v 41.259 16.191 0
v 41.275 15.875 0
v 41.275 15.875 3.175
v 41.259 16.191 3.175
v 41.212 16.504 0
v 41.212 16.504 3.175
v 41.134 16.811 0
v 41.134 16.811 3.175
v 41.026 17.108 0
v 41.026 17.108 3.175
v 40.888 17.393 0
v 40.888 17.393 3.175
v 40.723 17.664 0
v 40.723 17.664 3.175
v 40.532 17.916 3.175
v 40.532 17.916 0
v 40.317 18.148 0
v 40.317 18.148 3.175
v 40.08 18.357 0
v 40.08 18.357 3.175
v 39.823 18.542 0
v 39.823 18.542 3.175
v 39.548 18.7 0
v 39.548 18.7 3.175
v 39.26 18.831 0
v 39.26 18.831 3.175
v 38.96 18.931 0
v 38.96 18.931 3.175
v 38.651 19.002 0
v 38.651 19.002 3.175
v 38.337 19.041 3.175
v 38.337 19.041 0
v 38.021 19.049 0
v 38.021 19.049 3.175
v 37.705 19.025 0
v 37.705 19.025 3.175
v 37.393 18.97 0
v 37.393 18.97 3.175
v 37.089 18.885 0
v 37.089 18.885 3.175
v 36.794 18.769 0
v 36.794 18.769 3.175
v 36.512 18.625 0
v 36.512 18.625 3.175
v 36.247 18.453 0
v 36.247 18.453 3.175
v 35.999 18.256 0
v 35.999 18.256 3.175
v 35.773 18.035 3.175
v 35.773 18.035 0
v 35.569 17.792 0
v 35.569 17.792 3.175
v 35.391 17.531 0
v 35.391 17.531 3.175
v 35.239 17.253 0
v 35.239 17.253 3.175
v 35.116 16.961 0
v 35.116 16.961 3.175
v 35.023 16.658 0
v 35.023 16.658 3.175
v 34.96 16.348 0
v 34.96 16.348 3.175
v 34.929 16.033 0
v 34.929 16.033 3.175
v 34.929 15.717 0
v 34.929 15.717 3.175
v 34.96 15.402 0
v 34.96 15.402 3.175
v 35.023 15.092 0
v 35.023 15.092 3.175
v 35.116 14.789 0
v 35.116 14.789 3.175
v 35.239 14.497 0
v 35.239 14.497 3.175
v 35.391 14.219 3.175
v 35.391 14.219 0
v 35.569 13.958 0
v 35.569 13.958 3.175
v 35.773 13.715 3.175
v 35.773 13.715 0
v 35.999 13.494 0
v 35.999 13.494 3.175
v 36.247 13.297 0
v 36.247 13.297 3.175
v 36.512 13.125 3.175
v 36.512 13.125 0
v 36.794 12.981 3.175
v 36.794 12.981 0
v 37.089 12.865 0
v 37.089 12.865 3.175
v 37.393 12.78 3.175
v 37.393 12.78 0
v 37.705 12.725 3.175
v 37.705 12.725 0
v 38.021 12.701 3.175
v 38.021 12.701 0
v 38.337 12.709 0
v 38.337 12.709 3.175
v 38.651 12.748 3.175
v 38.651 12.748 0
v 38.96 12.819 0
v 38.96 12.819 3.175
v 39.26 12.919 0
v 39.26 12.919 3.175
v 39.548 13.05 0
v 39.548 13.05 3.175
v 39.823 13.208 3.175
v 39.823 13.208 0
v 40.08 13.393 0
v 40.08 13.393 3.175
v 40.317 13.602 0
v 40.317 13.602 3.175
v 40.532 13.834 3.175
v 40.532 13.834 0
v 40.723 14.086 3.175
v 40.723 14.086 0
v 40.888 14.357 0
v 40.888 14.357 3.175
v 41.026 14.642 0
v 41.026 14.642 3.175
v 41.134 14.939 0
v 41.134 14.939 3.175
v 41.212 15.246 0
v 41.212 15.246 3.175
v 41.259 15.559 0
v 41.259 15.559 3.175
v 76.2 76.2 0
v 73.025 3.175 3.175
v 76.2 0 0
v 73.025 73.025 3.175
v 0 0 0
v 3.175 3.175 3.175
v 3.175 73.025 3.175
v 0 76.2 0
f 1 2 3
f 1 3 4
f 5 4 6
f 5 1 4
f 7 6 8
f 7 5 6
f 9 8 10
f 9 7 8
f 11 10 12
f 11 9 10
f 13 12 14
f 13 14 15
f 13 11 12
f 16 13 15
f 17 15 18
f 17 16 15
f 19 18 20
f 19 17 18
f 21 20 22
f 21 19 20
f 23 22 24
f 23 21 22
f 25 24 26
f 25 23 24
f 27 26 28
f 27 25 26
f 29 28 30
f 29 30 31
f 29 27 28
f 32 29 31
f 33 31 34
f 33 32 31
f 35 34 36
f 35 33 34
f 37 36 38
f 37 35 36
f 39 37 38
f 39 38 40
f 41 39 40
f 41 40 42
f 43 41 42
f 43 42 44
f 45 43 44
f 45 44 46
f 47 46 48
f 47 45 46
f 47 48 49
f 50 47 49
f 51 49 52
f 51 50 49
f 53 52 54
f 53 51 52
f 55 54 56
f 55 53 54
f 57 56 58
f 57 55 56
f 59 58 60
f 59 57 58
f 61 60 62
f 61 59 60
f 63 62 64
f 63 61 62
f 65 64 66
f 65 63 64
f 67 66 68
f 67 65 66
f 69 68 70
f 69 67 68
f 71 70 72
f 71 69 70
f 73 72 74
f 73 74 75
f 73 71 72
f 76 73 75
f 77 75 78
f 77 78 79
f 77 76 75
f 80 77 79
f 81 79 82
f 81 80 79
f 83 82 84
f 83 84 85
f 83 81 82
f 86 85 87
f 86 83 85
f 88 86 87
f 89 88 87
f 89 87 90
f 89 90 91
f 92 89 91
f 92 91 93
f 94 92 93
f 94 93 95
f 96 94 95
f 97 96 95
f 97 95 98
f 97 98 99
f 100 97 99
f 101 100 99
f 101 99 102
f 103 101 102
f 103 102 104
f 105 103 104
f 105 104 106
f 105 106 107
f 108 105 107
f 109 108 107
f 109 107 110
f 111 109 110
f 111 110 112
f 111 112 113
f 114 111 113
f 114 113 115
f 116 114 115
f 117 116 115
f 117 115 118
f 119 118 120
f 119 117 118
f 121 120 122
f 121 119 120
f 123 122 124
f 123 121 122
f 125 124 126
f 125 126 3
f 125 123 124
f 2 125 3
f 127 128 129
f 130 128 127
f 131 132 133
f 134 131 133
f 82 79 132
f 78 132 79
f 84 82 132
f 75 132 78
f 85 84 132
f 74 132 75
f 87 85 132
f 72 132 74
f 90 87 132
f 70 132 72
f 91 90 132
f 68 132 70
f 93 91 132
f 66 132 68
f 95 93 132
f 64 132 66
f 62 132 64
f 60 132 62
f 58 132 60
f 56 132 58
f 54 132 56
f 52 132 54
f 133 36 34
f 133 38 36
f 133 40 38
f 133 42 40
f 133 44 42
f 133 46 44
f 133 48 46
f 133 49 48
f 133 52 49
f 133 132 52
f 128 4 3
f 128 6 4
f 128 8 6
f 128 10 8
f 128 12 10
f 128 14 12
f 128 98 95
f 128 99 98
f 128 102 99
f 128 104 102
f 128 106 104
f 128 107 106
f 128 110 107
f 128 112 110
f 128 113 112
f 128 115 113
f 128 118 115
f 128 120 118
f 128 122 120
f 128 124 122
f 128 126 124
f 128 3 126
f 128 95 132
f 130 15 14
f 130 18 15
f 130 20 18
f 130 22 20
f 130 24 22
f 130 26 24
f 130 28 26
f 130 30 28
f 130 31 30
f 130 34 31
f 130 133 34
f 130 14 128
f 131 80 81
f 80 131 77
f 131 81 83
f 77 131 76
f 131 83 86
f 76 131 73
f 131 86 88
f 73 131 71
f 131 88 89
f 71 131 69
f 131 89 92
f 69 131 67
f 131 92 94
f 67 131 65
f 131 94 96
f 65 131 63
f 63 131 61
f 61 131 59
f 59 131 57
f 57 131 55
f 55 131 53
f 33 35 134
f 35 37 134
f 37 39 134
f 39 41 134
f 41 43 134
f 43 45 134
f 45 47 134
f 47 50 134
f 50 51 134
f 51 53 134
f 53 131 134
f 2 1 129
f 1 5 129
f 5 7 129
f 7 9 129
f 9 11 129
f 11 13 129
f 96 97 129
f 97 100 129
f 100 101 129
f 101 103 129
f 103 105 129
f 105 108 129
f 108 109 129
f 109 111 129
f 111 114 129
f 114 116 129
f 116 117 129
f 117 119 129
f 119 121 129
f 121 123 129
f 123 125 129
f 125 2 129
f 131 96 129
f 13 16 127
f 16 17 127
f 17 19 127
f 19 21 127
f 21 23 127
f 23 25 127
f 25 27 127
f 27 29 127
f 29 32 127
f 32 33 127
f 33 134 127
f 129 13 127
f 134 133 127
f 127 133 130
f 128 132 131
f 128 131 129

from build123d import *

# Parameters (mm, degrees)
F0_W     = 76.2
F0_H     = 76.2
F0_R     = 3.175
F1_DEPTH = 3.175
F2_SIZE  = 3.17499


# Not quite as in the source:
# - a fillet or chamfer is up to 0.001 mm smaller than in the source, because OpenCascade refuses the exact size


with BuildPart() as f1:
    # F0 (on Top) → F1 (new body)
    with BuildSketch(Plane.XY):
        with Locations((38.1, 38.1)):
            Rectangle(F0_W, F0_H)
        with Locations((38.1, 15.875)):
            Circle(F0_R, mode=Mode.SUBTRACT)
    extrude(amount=F1_DEPTH)

    # F2 (size 3.175 in the source; OpenCascade refuses exactly that, so slightly less here)
    f2_edges = [f1.edges().sort_by_distance(p)[0] for p in [
        (38.1, 76.2, 3.175),
        (76.2, 38.1, 3.175),
        (38.1, 0, 3.175),
        (0, 38.1, 3.175),
    ]]
    chamfer(f2_edges, length=F2_SIZE)


solid = f1.part
